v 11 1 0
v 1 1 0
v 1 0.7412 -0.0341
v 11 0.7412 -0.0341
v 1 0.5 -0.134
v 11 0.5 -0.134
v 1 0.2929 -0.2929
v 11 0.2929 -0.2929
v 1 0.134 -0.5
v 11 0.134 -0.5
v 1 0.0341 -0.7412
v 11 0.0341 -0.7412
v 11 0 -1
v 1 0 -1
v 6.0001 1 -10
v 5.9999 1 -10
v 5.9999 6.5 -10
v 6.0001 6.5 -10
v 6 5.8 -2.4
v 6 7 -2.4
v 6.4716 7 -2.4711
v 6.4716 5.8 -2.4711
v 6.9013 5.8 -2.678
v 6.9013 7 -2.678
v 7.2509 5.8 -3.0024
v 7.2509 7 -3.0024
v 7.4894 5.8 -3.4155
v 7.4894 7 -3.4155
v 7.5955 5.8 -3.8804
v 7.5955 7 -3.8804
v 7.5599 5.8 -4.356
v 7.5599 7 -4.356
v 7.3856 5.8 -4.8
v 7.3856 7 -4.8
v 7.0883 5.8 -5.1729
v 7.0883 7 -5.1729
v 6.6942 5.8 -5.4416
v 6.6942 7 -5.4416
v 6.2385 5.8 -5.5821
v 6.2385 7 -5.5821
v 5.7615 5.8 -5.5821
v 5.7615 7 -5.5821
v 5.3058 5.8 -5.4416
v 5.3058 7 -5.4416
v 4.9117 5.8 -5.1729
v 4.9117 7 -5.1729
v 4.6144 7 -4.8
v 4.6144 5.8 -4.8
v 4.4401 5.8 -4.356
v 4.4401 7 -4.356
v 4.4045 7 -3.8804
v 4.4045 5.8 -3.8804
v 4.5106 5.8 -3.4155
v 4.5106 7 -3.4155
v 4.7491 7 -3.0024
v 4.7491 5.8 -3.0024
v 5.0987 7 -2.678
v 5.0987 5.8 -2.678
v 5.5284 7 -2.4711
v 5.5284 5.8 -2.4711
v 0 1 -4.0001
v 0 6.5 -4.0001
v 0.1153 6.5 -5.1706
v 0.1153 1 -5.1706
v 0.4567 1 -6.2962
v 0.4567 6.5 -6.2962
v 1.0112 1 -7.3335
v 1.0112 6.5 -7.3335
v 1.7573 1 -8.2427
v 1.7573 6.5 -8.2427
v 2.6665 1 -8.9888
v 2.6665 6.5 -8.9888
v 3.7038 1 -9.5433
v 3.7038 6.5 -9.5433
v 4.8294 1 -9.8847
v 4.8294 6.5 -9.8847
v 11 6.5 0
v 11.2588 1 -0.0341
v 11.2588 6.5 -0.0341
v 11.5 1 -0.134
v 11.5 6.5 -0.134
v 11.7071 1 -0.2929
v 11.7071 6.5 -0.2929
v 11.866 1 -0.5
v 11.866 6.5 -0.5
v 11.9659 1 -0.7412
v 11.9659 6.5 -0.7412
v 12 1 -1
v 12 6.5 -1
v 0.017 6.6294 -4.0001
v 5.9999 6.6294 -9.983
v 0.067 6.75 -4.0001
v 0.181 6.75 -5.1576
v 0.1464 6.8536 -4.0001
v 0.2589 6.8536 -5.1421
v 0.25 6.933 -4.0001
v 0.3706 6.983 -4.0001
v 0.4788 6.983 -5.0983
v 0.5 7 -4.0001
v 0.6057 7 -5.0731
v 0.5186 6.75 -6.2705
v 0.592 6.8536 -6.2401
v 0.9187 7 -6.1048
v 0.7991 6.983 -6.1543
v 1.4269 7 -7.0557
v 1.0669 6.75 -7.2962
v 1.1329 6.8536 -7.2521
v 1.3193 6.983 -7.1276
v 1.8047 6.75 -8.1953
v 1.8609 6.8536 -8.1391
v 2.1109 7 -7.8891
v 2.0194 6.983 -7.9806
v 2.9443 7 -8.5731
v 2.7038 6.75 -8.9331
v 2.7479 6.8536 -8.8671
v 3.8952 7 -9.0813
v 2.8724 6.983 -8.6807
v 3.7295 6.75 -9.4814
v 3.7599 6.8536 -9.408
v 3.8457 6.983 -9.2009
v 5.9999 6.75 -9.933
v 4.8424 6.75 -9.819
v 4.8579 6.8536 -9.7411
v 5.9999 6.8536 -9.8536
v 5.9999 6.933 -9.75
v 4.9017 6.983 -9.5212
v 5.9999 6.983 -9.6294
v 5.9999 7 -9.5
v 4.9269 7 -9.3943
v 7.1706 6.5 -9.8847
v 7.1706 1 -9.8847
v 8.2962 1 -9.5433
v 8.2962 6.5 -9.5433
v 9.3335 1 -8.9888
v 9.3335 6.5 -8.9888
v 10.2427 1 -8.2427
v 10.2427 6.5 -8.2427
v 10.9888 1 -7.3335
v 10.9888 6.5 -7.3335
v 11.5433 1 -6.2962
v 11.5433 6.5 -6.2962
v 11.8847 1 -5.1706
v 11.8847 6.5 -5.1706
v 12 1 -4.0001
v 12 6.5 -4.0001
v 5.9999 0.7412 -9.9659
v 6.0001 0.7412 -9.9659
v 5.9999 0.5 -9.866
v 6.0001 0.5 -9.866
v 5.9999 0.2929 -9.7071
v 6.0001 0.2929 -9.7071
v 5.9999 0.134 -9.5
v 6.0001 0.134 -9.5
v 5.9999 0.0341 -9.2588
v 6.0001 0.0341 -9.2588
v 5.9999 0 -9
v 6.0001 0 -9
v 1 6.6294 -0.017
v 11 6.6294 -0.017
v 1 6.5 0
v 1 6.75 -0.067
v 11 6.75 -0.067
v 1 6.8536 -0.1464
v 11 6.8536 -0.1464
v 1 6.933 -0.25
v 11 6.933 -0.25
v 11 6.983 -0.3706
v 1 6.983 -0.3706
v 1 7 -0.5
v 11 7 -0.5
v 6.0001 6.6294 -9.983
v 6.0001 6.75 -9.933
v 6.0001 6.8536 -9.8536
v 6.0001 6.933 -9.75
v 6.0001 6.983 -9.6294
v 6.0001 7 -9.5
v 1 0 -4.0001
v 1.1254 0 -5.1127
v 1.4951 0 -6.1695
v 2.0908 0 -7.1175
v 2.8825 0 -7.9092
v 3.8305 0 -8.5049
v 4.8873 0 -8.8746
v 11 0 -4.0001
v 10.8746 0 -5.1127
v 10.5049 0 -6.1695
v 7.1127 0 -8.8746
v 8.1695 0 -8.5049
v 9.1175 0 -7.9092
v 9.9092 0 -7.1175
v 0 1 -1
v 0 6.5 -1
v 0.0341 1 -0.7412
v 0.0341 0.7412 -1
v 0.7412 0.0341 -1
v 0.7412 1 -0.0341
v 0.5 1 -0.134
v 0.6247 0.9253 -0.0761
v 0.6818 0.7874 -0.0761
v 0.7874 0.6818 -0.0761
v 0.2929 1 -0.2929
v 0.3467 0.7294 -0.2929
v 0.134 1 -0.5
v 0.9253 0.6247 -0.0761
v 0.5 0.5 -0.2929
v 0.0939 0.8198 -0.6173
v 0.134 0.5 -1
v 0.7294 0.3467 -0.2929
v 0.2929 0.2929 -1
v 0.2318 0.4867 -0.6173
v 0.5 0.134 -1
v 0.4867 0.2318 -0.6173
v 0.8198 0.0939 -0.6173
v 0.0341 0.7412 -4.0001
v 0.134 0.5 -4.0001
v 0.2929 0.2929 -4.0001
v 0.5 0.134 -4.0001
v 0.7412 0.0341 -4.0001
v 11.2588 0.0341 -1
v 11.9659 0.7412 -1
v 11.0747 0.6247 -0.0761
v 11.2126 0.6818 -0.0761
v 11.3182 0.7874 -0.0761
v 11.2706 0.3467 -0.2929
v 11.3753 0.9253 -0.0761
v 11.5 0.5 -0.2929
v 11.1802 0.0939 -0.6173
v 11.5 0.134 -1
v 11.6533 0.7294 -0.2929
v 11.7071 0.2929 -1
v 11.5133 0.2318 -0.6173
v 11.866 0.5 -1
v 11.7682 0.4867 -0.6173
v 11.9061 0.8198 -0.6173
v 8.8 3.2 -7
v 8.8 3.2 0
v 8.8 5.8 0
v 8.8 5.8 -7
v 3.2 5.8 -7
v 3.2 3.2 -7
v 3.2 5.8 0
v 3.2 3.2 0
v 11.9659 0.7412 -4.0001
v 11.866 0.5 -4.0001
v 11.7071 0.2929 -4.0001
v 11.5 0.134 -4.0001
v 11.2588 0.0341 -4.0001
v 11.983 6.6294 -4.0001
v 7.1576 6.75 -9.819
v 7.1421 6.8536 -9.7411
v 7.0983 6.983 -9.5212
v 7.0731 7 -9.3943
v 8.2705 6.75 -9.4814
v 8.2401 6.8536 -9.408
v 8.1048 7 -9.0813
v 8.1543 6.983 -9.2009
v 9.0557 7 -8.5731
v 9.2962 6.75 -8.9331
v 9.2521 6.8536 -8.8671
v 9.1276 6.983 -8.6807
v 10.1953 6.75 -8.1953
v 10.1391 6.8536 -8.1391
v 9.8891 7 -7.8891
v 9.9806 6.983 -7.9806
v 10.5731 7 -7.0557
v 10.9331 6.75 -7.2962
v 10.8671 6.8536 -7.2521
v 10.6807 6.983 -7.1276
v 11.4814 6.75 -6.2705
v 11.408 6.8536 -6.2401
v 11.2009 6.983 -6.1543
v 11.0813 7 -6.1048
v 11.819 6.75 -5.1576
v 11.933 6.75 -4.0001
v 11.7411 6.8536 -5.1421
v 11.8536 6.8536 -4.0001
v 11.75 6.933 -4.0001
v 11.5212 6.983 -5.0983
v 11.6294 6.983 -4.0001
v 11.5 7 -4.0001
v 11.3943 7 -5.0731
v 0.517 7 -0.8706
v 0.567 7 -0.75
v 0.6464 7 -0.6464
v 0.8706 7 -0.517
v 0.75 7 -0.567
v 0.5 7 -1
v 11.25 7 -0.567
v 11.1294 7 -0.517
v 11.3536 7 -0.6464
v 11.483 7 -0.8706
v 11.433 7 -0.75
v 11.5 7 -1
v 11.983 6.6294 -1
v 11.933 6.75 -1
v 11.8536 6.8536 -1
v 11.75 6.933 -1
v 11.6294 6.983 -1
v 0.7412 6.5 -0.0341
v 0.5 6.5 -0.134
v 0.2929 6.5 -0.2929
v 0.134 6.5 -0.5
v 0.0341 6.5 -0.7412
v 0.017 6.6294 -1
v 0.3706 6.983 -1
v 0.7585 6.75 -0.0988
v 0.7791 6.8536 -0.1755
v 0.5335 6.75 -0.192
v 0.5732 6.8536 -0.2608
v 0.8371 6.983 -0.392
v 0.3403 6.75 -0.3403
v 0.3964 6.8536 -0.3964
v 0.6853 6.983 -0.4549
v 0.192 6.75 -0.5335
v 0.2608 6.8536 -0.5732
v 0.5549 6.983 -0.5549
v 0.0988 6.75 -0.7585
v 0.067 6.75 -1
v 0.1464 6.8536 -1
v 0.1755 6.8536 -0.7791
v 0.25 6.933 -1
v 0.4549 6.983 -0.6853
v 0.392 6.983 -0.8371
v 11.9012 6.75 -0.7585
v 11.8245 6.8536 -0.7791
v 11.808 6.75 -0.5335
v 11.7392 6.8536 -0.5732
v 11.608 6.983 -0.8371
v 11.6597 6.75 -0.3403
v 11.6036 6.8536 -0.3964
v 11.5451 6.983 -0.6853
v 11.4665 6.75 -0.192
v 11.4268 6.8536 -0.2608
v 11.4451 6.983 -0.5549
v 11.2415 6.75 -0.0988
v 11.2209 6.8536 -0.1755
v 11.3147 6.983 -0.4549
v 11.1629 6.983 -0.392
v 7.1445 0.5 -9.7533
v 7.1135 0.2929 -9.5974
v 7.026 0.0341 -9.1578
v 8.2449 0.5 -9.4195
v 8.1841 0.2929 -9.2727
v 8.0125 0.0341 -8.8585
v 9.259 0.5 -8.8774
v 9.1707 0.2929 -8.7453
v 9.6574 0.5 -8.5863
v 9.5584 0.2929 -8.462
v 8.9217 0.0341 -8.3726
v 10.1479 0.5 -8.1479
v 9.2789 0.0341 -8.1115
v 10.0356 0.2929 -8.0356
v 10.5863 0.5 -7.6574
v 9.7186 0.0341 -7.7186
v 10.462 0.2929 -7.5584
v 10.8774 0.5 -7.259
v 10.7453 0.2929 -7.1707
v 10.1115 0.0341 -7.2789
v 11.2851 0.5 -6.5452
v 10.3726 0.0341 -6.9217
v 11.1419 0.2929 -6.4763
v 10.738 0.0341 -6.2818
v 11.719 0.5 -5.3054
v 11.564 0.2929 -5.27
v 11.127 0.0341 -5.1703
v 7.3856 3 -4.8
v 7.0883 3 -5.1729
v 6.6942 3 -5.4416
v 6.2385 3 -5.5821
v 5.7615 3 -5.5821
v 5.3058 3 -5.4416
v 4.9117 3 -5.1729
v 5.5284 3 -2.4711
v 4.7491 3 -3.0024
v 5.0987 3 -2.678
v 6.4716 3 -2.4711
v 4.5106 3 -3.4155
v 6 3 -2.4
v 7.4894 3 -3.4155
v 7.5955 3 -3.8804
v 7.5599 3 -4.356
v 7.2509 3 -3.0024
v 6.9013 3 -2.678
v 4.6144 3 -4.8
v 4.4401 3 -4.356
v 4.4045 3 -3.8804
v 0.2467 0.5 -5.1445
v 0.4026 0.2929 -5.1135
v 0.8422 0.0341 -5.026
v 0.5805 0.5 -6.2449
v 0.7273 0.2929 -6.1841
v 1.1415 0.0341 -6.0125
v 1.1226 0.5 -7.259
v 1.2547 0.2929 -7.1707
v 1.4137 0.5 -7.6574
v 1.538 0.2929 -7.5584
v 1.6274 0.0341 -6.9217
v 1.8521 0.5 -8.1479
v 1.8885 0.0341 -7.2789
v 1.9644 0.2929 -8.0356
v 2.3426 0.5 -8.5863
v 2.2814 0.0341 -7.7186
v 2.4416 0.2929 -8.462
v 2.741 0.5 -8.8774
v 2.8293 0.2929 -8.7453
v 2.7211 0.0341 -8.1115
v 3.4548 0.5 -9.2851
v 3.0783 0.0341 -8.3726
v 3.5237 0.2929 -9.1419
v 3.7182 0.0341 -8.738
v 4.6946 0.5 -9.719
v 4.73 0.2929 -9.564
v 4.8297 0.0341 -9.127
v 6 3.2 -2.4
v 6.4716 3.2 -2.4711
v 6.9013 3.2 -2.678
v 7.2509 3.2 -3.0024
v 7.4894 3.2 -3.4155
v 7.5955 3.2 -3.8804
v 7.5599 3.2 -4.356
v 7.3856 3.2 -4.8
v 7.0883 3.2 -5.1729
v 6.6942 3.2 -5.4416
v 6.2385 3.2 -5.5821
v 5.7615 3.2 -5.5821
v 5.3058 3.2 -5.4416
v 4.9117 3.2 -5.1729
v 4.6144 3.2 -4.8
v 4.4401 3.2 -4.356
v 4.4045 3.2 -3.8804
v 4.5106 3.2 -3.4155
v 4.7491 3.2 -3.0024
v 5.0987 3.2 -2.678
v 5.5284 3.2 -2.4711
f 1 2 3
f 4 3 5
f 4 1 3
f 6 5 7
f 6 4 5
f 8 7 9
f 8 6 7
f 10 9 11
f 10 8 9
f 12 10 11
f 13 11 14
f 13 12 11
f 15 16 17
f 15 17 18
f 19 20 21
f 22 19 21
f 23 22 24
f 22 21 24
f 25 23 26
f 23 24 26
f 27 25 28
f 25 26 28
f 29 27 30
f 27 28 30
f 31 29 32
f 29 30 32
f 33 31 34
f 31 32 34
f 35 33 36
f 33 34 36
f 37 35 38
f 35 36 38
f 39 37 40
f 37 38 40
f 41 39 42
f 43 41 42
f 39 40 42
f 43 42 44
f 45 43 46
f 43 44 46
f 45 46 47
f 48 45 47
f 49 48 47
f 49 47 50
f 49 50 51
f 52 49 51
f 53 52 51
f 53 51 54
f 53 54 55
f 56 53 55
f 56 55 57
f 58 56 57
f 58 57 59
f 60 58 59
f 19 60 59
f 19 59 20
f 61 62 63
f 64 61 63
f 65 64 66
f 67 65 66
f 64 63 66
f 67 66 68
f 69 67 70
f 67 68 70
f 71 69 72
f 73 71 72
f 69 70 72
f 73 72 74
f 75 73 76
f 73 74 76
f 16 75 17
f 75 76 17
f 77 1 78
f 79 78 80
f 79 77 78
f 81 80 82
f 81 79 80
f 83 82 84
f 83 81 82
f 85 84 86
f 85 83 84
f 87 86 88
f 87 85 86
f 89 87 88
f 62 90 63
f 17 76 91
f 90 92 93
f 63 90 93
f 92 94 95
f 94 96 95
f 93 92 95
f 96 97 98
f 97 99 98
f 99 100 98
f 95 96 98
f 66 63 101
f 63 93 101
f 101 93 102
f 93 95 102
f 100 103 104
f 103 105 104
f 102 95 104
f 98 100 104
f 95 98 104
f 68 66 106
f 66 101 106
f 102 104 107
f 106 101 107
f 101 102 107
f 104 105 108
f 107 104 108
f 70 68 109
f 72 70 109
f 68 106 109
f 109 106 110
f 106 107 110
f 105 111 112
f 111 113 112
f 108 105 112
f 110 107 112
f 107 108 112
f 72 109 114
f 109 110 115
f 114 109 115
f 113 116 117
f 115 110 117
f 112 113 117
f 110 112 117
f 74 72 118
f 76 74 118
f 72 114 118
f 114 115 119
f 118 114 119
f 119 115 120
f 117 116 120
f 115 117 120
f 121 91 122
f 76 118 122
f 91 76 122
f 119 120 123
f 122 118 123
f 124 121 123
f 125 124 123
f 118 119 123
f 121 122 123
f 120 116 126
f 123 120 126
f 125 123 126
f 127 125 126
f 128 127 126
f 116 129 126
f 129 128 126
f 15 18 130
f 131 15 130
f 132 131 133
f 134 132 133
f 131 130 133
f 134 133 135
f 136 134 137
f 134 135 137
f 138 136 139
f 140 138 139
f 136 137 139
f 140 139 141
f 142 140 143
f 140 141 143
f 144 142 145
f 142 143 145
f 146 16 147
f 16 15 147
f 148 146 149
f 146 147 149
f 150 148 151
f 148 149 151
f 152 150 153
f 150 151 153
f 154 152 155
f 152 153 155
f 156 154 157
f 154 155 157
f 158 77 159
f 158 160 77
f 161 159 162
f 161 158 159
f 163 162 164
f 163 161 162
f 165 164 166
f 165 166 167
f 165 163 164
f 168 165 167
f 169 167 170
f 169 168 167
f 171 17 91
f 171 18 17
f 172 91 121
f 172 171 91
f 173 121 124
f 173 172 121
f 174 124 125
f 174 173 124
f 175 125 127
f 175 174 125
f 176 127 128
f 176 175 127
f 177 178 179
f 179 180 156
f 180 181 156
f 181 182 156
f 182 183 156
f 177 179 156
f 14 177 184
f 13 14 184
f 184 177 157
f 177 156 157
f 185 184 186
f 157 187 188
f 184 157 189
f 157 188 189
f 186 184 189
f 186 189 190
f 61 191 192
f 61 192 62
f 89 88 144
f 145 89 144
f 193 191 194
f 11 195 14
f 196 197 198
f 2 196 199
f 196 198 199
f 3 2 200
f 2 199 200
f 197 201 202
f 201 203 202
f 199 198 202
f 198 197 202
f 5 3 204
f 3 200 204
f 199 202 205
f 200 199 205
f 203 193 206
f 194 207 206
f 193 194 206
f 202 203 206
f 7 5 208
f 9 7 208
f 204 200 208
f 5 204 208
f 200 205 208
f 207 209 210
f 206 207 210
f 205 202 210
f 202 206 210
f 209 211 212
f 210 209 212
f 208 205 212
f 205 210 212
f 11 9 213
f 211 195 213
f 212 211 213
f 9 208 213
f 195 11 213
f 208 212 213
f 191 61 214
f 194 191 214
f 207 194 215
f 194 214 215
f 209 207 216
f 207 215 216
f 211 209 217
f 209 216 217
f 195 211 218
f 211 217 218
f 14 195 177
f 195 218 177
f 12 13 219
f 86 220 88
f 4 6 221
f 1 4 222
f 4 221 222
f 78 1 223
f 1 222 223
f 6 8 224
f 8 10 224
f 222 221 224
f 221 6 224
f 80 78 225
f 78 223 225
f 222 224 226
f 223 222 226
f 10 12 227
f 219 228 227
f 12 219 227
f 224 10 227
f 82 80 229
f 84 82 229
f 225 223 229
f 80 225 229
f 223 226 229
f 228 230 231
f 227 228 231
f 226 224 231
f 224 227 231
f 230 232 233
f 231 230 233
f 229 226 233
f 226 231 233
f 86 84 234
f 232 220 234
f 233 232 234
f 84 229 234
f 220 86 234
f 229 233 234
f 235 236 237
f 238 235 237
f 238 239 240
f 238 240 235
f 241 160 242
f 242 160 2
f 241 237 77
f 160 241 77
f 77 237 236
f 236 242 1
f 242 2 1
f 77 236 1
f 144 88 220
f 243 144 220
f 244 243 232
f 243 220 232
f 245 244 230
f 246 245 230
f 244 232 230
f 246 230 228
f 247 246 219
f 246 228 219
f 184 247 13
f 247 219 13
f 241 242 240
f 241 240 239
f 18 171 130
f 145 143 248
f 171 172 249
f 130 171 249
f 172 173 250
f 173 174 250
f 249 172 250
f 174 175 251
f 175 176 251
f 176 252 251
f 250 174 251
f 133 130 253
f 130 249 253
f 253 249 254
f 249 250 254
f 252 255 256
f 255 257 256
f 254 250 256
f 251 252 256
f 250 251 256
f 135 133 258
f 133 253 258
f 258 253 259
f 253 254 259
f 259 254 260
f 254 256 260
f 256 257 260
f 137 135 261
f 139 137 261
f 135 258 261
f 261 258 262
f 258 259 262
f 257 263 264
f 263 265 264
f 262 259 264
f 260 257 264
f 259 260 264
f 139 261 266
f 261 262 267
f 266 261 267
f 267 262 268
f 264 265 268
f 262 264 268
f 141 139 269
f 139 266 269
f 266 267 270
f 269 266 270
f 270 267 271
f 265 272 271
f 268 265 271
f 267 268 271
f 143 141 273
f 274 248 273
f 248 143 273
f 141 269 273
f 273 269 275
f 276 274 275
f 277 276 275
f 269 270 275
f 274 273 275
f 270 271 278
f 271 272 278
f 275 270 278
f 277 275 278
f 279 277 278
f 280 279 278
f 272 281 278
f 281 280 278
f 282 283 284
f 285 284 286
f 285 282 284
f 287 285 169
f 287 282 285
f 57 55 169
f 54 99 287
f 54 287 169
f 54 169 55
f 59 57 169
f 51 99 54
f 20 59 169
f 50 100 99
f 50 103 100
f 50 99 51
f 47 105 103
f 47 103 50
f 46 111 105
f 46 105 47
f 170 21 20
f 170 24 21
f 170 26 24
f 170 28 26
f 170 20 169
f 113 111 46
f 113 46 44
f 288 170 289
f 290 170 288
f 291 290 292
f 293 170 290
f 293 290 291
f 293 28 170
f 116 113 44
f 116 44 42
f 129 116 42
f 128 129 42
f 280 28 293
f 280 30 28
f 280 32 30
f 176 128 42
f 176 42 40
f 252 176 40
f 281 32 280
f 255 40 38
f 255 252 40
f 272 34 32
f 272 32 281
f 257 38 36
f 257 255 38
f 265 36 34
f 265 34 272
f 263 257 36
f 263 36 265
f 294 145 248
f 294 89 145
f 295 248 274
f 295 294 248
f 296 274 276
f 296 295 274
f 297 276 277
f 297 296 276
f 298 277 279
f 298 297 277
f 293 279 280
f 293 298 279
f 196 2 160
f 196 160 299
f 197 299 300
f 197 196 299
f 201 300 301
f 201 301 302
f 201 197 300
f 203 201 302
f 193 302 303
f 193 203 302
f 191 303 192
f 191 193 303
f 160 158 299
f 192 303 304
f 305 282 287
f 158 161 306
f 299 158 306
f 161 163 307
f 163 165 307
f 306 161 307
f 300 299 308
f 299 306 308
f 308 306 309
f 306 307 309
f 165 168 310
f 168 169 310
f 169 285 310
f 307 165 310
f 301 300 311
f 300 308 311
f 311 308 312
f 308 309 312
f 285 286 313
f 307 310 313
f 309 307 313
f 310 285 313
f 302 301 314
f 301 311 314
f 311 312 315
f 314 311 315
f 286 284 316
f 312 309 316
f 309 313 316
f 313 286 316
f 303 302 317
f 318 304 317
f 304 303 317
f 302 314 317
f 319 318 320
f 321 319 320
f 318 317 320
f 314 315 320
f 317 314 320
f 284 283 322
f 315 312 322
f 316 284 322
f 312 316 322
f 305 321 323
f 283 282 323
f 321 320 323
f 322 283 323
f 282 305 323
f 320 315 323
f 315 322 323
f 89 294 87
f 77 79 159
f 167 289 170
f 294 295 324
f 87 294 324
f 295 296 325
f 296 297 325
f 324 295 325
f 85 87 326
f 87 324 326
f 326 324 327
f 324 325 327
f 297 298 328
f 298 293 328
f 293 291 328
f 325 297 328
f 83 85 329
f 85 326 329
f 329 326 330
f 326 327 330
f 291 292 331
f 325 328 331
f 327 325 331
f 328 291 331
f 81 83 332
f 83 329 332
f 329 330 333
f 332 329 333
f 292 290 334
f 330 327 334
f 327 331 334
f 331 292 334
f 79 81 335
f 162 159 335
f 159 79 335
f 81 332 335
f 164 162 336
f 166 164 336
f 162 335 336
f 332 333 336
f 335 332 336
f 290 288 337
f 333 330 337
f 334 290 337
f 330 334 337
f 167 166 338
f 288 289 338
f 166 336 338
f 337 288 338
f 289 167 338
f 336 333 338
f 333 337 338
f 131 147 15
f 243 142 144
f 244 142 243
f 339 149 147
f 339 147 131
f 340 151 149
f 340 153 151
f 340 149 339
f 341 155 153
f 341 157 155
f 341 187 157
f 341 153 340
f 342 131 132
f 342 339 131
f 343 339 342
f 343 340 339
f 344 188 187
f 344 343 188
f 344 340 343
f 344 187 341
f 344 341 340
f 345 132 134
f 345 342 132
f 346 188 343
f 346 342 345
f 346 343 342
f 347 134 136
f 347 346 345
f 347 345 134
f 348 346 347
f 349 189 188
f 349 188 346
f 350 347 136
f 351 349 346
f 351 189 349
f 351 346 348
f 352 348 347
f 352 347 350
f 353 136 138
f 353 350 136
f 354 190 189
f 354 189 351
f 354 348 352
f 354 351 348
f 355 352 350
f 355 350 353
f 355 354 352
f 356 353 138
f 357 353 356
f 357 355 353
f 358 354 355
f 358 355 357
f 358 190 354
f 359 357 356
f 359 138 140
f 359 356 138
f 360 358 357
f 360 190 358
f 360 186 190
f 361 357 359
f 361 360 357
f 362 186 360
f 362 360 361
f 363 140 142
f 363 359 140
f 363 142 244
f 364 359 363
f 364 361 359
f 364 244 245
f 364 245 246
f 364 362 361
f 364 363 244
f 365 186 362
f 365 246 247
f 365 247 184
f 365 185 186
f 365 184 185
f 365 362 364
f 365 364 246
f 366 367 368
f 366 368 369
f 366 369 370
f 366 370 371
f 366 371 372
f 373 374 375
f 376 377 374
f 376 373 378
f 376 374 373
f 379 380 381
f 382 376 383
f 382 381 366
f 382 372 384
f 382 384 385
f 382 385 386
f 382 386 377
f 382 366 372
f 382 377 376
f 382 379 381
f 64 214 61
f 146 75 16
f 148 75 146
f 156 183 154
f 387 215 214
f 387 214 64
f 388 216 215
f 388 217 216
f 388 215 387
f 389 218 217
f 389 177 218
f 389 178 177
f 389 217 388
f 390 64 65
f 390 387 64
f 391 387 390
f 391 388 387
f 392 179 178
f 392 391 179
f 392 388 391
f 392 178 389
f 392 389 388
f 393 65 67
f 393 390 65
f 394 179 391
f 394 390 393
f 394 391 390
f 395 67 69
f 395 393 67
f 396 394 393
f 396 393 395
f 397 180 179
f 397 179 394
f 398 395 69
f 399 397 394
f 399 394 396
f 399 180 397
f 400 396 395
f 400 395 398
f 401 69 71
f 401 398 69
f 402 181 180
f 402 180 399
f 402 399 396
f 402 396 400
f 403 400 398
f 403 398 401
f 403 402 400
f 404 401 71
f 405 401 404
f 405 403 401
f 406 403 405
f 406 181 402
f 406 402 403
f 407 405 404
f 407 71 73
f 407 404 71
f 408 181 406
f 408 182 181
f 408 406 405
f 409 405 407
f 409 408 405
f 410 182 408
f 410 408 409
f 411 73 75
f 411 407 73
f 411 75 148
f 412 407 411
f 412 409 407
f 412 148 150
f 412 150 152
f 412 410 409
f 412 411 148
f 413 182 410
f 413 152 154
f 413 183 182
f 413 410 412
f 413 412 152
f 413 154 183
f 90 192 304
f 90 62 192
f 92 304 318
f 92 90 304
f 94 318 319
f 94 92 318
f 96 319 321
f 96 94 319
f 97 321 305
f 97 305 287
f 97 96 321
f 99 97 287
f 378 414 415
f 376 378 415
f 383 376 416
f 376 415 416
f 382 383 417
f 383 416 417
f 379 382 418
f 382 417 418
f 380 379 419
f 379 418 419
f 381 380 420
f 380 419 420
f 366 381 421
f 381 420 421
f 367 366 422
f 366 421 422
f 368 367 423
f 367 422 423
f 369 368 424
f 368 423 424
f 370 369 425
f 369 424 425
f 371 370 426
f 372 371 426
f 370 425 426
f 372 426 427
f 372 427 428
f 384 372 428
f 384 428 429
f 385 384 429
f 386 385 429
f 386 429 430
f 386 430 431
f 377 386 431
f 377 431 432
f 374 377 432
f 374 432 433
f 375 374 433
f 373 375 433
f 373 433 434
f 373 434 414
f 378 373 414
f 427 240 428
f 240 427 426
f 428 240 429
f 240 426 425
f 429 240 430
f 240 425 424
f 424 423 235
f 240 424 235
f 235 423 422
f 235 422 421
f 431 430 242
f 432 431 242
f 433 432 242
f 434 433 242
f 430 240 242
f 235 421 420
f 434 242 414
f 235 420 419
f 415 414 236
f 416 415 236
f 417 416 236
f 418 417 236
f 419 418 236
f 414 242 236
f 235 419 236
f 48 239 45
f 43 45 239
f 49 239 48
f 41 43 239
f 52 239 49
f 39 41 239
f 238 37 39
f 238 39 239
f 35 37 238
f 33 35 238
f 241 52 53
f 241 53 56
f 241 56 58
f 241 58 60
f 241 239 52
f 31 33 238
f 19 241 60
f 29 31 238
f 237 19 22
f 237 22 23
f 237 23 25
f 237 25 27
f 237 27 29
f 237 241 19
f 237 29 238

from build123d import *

# Parameters (mm, degrees)
SKETCH1_W           = 12
SKETCH1_H           = 10
BOSS_EXTRUDE1_DEPTH = 7
SKETCH2_R           = 1.6
CUT_EXTRUDE1_DEPTH  = 4
SKETCH3_W           = 5.6
SKETCH3_H           = 2.6
CUT_EXTRUDE2_DEPTH  = 7
FILLET1_R           = 6
FILLET2_R           = 1
FILLET3_R           = 1
FILLET4_R           = 0.5


with BuildPart() as part:
    # Sketch1 → Boss-Extrude1 (new body)
    with BuildSketch(Plane(origin=(0, 0, 0), x_dir=(1, 0, 0), z_dir=(0, 1, 0))):
        with Locations((6, 5)):
            Rectangle(SKETCH1_W, SKETCH1_H)
    extrude(amount=BOSS_EXTRUDE1_DEPTH)

    # Sketch2 → Cut-Extrude1 (cut)
    with BuildSketch(Plane(origin=(0, 7, 0), x_dir=(1, 0, 0), z_dir=(0, 1, 0))):
        with Locations(Location((6, 4, 0), (0, 0, 270))):
            Circle(SKETCH2_R)
    extrude(amount=-CUT_EXTRUDE1_DEPTH, mode=Mode.SUBTRACT)

    # Sketch3 → Cut-Extrude2 (cut)
    with BuildSketch(Plane.XY):
        with Locations((6, 4.5)):
            Rectangle(SKETCH3_W, SKETCH3_H)
    extrude(amount=-CUT_EXTRUDE2_DEPTH, mode=Mode.SUBTRACT)

    # Fillet1
    fillet1_edges = [part.edges().sort_by_distance(p)[0] for p in [
        (0, 3.5, -10),
        (12, 3.5, -10),
    ]]
    fillet(fillet1_edges, radius=FILLET1_R - 0.0001)  # a hair under: the kernel refuses the full size

    # Fillet2
    fillet2_edges = [part.edges().sort_by_distance(p)[0] for p in [
        (0, 0, -2.00005),
        (10.242669976, 0, -8.242669976),
        (1.757330024, 0, -8.242669976),
        (12, 0, -2.00005),
    ]]
    fillet(fillet2_edges, radius=FILLET2_R)

    # Fillet3
    fillet3_edges = [part.edges().sort_by_distance(p)[0] for p in [
        (6, 0, 0),
        (11.707106781, 0.292893219, 0),
        (0.292893219, 0.292893219, 0),
        (12, 4, 0),
        (0, 4, 0),
    ]]
    fillet(fillet3_edges, radius=FILLET3_R)

    # Fillet4
    fillet4_edges = [part.edges().sort_by_distance(p)[0] for p in [
        (0, 7, -2.50005),
        (10.242669976, 7, -8.242669976),
        (1.757330024, 7, -8.242669976),
        (6, 7, 0),
        (12, 7, -2.50005),
        (11.707106781, 7, -0.292893219),
        (0.292893219, 7, -0.292893219),
    ]]
    fillet(fillet4_edges, radius=FILLET4_R)


solid = part.part
